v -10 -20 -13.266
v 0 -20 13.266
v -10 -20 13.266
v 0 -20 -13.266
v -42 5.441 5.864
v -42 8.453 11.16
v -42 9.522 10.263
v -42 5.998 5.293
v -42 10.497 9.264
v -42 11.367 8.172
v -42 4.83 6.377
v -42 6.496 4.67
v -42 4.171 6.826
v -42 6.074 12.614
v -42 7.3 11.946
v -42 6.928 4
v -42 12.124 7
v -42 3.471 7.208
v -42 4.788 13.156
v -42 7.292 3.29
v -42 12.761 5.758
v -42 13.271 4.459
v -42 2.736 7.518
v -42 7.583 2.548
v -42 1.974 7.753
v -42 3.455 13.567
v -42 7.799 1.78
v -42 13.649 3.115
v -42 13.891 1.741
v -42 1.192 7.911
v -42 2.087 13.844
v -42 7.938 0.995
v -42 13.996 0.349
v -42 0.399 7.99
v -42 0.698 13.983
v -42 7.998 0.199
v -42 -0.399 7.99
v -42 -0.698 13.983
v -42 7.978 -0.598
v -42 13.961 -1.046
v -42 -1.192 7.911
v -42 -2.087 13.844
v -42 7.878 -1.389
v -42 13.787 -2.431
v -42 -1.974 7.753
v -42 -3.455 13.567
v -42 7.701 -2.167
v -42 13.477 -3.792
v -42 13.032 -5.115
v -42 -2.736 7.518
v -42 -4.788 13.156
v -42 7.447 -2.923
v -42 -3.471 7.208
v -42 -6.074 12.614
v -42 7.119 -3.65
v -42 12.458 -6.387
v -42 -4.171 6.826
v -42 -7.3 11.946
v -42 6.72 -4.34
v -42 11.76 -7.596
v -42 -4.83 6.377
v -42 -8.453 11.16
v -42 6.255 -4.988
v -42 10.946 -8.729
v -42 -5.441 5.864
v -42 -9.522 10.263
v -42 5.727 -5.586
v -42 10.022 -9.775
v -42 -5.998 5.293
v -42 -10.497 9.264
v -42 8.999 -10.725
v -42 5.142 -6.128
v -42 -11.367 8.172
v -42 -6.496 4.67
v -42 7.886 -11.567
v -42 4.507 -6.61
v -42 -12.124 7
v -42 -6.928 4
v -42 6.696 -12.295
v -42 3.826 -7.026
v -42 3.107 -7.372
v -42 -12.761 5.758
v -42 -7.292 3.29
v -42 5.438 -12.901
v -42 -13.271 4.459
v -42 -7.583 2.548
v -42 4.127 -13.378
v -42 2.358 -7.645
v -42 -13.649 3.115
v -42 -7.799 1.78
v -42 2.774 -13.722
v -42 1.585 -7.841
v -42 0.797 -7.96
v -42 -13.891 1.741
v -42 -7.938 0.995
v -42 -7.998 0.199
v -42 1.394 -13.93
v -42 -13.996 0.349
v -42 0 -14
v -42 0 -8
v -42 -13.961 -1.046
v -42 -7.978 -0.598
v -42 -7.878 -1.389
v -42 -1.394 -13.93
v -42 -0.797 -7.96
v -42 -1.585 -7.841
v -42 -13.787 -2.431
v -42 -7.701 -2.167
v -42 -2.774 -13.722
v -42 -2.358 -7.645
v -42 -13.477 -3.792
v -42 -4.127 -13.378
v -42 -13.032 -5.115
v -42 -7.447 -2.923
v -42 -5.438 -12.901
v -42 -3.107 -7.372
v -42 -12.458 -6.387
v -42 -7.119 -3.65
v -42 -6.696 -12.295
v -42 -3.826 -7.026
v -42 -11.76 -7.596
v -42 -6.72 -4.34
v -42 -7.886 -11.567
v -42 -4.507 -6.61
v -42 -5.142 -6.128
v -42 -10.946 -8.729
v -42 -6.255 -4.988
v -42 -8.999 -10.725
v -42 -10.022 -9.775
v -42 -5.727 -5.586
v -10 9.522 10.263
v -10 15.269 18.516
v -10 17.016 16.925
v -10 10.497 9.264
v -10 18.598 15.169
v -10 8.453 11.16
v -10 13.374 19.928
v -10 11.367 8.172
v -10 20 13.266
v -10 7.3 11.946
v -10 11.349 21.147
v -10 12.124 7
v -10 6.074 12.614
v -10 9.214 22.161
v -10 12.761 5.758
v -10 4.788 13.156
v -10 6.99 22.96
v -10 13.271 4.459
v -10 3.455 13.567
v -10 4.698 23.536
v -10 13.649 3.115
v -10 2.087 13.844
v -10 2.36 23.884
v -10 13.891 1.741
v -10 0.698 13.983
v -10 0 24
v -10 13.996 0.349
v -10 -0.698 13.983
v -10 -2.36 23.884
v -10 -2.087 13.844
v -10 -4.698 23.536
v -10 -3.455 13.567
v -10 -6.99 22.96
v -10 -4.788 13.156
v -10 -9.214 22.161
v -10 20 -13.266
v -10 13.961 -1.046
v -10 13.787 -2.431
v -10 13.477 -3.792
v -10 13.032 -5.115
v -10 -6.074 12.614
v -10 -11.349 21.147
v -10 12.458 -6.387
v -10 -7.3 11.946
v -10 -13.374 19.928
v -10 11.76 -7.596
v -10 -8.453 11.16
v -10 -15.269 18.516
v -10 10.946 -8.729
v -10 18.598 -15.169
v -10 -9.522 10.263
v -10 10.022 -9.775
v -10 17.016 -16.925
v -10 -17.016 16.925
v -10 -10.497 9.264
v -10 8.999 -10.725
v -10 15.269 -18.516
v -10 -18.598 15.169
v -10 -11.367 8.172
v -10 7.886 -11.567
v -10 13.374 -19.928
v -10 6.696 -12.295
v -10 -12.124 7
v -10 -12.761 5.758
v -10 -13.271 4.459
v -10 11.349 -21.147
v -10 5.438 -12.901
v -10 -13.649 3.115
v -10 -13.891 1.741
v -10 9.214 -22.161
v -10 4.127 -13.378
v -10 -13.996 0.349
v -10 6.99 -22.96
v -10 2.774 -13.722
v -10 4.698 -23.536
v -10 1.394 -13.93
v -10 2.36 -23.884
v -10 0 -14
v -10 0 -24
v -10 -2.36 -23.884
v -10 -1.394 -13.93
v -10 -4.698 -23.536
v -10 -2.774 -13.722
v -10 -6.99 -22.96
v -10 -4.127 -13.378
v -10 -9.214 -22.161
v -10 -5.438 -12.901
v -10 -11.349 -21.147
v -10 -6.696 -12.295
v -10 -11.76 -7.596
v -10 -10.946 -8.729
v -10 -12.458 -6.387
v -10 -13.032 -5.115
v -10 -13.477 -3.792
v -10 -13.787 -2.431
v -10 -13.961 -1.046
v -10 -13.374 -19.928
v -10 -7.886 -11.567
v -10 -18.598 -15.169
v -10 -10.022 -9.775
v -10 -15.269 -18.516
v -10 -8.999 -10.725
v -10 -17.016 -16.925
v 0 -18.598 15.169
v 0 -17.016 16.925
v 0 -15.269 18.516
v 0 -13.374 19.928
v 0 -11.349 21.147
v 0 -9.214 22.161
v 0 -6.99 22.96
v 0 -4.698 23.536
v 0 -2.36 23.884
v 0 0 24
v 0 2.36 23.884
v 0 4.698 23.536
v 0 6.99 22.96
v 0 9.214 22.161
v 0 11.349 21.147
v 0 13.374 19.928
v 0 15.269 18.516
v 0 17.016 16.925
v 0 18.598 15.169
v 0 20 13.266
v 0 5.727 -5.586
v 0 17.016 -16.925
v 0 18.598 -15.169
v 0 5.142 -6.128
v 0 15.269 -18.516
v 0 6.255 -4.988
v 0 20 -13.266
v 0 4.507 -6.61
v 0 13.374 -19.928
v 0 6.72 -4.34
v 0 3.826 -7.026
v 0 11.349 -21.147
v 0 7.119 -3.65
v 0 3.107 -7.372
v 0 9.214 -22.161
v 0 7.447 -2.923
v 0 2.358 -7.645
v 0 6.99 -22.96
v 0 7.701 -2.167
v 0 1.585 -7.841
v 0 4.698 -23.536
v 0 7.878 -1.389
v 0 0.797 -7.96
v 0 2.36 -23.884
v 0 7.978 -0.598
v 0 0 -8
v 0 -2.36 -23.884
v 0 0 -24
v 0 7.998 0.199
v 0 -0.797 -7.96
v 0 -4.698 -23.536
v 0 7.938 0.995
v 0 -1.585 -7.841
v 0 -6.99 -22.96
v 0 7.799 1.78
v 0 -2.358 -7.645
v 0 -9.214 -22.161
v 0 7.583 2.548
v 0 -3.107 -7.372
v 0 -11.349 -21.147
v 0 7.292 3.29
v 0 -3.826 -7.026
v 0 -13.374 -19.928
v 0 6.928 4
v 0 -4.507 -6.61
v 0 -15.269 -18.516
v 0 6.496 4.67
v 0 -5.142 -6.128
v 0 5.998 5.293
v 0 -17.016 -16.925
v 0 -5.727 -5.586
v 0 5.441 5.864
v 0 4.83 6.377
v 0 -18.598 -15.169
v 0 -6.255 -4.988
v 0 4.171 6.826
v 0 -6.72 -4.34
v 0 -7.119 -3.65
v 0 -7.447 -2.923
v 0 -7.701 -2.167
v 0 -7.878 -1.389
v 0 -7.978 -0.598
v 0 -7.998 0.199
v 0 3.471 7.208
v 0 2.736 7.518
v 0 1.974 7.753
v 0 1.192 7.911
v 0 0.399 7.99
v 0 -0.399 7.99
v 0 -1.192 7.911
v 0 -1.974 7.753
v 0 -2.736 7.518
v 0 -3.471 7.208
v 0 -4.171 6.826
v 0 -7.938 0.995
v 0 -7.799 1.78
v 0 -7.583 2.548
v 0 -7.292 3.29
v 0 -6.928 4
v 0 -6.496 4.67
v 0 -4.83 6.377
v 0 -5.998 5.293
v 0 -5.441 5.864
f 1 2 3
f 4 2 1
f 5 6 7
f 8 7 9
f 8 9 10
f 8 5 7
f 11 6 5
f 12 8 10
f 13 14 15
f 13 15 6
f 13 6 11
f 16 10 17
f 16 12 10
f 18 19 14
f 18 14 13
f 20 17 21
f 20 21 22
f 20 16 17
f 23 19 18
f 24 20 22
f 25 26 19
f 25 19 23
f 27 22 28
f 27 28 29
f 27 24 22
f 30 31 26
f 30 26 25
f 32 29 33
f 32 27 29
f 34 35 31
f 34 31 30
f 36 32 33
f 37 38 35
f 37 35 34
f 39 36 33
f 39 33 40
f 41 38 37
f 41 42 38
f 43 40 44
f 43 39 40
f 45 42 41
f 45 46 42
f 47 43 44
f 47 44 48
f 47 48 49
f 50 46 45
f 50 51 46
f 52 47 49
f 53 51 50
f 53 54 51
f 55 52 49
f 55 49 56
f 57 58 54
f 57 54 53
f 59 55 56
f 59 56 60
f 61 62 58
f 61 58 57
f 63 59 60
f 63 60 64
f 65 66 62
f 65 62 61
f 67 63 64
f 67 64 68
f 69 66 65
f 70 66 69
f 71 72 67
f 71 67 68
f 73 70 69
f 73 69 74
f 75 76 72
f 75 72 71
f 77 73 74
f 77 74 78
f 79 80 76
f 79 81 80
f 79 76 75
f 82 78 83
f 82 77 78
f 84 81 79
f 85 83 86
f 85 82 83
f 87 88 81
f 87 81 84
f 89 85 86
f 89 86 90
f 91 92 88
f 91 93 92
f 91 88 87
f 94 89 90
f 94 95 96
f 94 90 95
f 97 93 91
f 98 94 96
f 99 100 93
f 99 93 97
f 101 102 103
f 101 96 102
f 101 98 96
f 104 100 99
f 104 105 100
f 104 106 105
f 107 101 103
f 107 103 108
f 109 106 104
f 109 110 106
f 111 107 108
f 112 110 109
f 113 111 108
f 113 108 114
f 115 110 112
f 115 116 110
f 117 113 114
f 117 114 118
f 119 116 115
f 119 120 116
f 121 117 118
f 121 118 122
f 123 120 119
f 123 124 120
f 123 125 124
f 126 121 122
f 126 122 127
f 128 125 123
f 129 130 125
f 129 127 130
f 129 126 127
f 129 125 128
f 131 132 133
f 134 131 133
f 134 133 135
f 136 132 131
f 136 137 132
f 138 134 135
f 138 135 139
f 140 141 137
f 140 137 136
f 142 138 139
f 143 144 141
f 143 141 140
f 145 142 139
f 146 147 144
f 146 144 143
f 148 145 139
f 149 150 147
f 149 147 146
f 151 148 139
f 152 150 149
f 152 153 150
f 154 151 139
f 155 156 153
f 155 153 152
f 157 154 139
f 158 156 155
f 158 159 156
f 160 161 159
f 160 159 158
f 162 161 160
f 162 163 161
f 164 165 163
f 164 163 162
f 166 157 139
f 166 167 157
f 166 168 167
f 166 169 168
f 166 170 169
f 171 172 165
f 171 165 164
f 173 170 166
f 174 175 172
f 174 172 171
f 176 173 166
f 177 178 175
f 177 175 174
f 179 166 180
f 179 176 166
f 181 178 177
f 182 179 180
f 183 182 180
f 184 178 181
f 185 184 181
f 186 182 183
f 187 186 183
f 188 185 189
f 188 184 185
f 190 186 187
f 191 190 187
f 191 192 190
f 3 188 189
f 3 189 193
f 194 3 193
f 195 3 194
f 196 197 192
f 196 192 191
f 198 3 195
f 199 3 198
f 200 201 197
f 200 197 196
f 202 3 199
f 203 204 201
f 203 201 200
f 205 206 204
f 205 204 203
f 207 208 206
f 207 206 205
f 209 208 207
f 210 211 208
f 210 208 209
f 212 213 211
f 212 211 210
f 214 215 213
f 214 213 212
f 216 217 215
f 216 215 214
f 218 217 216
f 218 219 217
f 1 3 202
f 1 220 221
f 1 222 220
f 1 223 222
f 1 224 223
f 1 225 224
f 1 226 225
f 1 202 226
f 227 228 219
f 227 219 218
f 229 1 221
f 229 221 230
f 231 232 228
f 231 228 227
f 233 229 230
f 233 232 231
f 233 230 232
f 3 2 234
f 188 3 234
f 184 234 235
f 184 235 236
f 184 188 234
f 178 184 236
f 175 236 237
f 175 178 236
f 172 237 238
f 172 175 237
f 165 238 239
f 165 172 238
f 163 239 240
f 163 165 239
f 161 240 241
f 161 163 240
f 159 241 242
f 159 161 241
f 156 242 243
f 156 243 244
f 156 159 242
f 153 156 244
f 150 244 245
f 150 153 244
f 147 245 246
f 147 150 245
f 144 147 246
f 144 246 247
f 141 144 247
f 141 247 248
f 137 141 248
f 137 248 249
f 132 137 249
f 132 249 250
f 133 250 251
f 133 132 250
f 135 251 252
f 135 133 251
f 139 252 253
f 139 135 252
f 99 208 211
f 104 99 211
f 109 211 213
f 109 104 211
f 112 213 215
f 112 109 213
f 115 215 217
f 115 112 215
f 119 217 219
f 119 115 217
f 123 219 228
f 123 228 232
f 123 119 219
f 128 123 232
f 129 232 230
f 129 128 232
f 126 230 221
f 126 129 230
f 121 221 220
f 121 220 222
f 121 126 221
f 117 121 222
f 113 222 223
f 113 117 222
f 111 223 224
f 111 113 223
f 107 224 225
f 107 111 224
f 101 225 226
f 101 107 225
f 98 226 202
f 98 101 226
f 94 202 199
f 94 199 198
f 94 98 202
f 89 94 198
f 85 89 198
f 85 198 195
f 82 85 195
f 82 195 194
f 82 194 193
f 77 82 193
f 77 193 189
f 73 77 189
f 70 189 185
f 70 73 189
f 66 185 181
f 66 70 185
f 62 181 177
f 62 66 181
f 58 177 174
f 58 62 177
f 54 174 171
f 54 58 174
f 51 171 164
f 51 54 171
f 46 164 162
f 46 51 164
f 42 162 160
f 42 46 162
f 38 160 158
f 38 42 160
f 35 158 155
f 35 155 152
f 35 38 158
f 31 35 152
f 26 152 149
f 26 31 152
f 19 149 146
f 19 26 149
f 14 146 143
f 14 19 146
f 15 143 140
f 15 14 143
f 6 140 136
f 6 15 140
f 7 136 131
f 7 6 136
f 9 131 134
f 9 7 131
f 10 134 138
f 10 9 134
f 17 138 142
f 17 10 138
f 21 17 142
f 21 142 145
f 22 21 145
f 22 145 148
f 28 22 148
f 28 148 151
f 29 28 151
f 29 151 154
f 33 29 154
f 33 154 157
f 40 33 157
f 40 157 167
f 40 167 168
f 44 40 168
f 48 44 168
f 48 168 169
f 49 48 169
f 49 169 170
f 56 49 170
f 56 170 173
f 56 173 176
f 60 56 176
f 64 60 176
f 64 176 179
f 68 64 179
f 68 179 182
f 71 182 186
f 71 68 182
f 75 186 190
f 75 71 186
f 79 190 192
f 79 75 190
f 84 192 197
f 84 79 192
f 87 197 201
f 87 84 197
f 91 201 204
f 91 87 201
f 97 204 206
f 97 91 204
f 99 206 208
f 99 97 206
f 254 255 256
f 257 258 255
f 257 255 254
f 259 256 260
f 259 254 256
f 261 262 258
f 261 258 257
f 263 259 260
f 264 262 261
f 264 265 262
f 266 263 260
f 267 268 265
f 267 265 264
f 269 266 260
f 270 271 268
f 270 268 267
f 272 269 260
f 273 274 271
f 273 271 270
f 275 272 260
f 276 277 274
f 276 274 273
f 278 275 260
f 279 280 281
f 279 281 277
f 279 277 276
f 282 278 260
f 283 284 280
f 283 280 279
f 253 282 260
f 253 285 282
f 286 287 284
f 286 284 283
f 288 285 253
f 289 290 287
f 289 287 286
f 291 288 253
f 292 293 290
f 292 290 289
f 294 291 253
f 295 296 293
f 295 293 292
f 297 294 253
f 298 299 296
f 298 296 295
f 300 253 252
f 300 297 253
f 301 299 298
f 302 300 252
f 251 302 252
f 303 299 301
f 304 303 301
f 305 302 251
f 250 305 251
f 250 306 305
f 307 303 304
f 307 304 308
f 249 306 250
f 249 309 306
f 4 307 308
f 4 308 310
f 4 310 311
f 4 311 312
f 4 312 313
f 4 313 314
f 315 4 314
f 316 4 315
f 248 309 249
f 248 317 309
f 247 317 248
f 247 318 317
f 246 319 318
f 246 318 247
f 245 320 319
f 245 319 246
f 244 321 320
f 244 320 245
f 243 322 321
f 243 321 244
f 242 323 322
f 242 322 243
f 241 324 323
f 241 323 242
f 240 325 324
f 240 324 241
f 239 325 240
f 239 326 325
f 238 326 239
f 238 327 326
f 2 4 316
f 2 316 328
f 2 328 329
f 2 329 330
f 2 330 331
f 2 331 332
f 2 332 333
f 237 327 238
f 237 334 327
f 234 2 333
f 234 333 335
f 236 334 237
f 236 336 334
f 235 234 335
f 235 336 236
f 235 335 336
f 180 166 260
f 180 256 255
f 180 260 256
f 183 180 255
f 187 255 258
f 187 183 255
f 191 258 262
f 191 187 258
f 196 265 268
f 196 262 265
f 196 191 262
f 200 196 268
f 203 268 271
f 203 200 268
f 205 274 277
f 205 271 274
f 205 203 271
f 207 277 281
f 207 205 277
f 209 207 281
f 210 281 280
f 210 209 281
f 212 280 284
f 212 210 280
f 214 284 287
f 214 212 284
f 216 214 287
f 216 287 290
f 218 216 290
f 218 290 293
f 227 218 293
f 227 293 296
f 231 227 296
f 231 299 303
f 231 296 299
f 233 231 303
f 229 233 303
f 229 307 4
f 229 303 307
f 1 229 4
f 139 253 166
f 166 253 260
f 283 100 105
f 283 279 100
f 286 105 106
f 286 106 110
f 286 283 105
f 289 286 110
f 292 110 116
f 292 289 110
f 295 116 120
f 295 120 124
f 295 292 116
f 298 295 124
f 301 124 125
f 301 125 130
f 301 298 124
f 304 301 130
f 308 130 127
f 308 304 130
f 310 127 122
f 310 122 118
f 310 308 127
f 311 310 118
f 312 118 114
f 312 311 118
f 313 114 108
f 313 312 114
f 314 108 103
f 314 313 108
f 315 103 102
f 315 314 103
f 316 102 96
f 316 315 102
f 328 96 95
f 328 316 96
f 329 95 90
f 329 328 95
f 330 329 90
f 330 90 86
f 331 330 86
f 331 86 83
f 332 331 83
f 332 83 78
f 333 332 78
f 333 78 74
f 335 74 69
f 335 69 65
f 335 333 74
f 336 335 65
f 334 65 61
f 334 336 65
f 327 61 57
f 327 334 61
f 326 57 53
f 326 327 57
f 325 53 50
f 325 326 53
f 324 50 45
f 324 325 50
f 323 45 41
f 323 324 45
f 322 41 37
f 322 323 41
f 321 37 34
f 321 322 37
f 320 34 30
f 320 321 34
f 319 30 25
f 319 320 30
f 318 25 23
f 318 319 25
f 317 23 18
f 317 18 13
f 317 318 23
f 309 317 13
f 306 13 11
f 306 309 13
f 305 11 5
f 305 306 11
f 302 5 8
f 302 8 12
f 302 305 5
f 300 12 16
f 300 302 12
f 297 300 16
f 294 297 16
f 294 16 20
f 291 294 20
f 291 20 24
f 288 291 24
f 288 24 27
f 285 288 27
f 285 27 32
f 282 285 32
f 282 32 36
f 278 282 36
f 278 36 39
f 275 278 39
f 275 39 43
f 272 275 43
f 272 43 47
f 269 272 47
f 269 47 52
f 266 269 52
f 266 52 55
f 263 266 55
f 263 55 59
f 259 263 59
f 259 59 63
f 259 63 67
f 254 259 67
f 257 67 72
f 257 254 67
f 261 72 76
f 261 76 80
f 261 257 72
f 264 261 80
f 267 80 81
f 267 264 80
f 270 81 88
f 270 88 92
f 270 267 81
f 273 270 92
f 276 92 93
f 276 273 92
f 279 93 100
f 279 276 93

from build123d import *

# Parameters (mm, degrees)
CROQUIS2_OUTSIDE_W    = 65.964
CROQUIS2_OUTSIDE_H    = 65.964
CROQUIS2_OUTSIDE_W_2  = 60
CROQUIS2_OUTSIDE_H_2  = 40
CORTAR_EXTRUIR1_DEPTH = 10


with BuildPart() as part:
    # Croquis1 → Revolución1 (revolve)
    with BuildSketch(Plane.XY, mode=Mode.PRIVATE) as revoluci_n1_sk:
        Polygon((0, 8), (0, 24), (-10, 24), (-10, 14), (-42, 14), (-42, 8), align=None)
    revolve(revoluci_n1_sk.sketch.rotate(Axis((0, 0, 0), (-1, 0, 0)), 90), axis=Axis((0, 0, 0), (-1, 0, 0)))

    # Croquis2 outside → Cortar-Extruir1 (cut)
    with BuildSketch(Plane(origin=(0, 0, 0), x_dir=(0, 0, -1), z_dir=(1, 0, 0))):
        Rectangle(CROQUIS2_OUTSIDE_W, CROQUIS2_OUTSIDE_H)
        Rectangle(CROQUIS2_OUTSIDE_W_2, CROQUIS2_OUTSIDE_H_2, mode=Mode.SUBTRACT)
    extrude(amount=-CORTAR_EXTRUIR1_DEPTH, mode=Mode.SUBTRACT)


solid = part.part
